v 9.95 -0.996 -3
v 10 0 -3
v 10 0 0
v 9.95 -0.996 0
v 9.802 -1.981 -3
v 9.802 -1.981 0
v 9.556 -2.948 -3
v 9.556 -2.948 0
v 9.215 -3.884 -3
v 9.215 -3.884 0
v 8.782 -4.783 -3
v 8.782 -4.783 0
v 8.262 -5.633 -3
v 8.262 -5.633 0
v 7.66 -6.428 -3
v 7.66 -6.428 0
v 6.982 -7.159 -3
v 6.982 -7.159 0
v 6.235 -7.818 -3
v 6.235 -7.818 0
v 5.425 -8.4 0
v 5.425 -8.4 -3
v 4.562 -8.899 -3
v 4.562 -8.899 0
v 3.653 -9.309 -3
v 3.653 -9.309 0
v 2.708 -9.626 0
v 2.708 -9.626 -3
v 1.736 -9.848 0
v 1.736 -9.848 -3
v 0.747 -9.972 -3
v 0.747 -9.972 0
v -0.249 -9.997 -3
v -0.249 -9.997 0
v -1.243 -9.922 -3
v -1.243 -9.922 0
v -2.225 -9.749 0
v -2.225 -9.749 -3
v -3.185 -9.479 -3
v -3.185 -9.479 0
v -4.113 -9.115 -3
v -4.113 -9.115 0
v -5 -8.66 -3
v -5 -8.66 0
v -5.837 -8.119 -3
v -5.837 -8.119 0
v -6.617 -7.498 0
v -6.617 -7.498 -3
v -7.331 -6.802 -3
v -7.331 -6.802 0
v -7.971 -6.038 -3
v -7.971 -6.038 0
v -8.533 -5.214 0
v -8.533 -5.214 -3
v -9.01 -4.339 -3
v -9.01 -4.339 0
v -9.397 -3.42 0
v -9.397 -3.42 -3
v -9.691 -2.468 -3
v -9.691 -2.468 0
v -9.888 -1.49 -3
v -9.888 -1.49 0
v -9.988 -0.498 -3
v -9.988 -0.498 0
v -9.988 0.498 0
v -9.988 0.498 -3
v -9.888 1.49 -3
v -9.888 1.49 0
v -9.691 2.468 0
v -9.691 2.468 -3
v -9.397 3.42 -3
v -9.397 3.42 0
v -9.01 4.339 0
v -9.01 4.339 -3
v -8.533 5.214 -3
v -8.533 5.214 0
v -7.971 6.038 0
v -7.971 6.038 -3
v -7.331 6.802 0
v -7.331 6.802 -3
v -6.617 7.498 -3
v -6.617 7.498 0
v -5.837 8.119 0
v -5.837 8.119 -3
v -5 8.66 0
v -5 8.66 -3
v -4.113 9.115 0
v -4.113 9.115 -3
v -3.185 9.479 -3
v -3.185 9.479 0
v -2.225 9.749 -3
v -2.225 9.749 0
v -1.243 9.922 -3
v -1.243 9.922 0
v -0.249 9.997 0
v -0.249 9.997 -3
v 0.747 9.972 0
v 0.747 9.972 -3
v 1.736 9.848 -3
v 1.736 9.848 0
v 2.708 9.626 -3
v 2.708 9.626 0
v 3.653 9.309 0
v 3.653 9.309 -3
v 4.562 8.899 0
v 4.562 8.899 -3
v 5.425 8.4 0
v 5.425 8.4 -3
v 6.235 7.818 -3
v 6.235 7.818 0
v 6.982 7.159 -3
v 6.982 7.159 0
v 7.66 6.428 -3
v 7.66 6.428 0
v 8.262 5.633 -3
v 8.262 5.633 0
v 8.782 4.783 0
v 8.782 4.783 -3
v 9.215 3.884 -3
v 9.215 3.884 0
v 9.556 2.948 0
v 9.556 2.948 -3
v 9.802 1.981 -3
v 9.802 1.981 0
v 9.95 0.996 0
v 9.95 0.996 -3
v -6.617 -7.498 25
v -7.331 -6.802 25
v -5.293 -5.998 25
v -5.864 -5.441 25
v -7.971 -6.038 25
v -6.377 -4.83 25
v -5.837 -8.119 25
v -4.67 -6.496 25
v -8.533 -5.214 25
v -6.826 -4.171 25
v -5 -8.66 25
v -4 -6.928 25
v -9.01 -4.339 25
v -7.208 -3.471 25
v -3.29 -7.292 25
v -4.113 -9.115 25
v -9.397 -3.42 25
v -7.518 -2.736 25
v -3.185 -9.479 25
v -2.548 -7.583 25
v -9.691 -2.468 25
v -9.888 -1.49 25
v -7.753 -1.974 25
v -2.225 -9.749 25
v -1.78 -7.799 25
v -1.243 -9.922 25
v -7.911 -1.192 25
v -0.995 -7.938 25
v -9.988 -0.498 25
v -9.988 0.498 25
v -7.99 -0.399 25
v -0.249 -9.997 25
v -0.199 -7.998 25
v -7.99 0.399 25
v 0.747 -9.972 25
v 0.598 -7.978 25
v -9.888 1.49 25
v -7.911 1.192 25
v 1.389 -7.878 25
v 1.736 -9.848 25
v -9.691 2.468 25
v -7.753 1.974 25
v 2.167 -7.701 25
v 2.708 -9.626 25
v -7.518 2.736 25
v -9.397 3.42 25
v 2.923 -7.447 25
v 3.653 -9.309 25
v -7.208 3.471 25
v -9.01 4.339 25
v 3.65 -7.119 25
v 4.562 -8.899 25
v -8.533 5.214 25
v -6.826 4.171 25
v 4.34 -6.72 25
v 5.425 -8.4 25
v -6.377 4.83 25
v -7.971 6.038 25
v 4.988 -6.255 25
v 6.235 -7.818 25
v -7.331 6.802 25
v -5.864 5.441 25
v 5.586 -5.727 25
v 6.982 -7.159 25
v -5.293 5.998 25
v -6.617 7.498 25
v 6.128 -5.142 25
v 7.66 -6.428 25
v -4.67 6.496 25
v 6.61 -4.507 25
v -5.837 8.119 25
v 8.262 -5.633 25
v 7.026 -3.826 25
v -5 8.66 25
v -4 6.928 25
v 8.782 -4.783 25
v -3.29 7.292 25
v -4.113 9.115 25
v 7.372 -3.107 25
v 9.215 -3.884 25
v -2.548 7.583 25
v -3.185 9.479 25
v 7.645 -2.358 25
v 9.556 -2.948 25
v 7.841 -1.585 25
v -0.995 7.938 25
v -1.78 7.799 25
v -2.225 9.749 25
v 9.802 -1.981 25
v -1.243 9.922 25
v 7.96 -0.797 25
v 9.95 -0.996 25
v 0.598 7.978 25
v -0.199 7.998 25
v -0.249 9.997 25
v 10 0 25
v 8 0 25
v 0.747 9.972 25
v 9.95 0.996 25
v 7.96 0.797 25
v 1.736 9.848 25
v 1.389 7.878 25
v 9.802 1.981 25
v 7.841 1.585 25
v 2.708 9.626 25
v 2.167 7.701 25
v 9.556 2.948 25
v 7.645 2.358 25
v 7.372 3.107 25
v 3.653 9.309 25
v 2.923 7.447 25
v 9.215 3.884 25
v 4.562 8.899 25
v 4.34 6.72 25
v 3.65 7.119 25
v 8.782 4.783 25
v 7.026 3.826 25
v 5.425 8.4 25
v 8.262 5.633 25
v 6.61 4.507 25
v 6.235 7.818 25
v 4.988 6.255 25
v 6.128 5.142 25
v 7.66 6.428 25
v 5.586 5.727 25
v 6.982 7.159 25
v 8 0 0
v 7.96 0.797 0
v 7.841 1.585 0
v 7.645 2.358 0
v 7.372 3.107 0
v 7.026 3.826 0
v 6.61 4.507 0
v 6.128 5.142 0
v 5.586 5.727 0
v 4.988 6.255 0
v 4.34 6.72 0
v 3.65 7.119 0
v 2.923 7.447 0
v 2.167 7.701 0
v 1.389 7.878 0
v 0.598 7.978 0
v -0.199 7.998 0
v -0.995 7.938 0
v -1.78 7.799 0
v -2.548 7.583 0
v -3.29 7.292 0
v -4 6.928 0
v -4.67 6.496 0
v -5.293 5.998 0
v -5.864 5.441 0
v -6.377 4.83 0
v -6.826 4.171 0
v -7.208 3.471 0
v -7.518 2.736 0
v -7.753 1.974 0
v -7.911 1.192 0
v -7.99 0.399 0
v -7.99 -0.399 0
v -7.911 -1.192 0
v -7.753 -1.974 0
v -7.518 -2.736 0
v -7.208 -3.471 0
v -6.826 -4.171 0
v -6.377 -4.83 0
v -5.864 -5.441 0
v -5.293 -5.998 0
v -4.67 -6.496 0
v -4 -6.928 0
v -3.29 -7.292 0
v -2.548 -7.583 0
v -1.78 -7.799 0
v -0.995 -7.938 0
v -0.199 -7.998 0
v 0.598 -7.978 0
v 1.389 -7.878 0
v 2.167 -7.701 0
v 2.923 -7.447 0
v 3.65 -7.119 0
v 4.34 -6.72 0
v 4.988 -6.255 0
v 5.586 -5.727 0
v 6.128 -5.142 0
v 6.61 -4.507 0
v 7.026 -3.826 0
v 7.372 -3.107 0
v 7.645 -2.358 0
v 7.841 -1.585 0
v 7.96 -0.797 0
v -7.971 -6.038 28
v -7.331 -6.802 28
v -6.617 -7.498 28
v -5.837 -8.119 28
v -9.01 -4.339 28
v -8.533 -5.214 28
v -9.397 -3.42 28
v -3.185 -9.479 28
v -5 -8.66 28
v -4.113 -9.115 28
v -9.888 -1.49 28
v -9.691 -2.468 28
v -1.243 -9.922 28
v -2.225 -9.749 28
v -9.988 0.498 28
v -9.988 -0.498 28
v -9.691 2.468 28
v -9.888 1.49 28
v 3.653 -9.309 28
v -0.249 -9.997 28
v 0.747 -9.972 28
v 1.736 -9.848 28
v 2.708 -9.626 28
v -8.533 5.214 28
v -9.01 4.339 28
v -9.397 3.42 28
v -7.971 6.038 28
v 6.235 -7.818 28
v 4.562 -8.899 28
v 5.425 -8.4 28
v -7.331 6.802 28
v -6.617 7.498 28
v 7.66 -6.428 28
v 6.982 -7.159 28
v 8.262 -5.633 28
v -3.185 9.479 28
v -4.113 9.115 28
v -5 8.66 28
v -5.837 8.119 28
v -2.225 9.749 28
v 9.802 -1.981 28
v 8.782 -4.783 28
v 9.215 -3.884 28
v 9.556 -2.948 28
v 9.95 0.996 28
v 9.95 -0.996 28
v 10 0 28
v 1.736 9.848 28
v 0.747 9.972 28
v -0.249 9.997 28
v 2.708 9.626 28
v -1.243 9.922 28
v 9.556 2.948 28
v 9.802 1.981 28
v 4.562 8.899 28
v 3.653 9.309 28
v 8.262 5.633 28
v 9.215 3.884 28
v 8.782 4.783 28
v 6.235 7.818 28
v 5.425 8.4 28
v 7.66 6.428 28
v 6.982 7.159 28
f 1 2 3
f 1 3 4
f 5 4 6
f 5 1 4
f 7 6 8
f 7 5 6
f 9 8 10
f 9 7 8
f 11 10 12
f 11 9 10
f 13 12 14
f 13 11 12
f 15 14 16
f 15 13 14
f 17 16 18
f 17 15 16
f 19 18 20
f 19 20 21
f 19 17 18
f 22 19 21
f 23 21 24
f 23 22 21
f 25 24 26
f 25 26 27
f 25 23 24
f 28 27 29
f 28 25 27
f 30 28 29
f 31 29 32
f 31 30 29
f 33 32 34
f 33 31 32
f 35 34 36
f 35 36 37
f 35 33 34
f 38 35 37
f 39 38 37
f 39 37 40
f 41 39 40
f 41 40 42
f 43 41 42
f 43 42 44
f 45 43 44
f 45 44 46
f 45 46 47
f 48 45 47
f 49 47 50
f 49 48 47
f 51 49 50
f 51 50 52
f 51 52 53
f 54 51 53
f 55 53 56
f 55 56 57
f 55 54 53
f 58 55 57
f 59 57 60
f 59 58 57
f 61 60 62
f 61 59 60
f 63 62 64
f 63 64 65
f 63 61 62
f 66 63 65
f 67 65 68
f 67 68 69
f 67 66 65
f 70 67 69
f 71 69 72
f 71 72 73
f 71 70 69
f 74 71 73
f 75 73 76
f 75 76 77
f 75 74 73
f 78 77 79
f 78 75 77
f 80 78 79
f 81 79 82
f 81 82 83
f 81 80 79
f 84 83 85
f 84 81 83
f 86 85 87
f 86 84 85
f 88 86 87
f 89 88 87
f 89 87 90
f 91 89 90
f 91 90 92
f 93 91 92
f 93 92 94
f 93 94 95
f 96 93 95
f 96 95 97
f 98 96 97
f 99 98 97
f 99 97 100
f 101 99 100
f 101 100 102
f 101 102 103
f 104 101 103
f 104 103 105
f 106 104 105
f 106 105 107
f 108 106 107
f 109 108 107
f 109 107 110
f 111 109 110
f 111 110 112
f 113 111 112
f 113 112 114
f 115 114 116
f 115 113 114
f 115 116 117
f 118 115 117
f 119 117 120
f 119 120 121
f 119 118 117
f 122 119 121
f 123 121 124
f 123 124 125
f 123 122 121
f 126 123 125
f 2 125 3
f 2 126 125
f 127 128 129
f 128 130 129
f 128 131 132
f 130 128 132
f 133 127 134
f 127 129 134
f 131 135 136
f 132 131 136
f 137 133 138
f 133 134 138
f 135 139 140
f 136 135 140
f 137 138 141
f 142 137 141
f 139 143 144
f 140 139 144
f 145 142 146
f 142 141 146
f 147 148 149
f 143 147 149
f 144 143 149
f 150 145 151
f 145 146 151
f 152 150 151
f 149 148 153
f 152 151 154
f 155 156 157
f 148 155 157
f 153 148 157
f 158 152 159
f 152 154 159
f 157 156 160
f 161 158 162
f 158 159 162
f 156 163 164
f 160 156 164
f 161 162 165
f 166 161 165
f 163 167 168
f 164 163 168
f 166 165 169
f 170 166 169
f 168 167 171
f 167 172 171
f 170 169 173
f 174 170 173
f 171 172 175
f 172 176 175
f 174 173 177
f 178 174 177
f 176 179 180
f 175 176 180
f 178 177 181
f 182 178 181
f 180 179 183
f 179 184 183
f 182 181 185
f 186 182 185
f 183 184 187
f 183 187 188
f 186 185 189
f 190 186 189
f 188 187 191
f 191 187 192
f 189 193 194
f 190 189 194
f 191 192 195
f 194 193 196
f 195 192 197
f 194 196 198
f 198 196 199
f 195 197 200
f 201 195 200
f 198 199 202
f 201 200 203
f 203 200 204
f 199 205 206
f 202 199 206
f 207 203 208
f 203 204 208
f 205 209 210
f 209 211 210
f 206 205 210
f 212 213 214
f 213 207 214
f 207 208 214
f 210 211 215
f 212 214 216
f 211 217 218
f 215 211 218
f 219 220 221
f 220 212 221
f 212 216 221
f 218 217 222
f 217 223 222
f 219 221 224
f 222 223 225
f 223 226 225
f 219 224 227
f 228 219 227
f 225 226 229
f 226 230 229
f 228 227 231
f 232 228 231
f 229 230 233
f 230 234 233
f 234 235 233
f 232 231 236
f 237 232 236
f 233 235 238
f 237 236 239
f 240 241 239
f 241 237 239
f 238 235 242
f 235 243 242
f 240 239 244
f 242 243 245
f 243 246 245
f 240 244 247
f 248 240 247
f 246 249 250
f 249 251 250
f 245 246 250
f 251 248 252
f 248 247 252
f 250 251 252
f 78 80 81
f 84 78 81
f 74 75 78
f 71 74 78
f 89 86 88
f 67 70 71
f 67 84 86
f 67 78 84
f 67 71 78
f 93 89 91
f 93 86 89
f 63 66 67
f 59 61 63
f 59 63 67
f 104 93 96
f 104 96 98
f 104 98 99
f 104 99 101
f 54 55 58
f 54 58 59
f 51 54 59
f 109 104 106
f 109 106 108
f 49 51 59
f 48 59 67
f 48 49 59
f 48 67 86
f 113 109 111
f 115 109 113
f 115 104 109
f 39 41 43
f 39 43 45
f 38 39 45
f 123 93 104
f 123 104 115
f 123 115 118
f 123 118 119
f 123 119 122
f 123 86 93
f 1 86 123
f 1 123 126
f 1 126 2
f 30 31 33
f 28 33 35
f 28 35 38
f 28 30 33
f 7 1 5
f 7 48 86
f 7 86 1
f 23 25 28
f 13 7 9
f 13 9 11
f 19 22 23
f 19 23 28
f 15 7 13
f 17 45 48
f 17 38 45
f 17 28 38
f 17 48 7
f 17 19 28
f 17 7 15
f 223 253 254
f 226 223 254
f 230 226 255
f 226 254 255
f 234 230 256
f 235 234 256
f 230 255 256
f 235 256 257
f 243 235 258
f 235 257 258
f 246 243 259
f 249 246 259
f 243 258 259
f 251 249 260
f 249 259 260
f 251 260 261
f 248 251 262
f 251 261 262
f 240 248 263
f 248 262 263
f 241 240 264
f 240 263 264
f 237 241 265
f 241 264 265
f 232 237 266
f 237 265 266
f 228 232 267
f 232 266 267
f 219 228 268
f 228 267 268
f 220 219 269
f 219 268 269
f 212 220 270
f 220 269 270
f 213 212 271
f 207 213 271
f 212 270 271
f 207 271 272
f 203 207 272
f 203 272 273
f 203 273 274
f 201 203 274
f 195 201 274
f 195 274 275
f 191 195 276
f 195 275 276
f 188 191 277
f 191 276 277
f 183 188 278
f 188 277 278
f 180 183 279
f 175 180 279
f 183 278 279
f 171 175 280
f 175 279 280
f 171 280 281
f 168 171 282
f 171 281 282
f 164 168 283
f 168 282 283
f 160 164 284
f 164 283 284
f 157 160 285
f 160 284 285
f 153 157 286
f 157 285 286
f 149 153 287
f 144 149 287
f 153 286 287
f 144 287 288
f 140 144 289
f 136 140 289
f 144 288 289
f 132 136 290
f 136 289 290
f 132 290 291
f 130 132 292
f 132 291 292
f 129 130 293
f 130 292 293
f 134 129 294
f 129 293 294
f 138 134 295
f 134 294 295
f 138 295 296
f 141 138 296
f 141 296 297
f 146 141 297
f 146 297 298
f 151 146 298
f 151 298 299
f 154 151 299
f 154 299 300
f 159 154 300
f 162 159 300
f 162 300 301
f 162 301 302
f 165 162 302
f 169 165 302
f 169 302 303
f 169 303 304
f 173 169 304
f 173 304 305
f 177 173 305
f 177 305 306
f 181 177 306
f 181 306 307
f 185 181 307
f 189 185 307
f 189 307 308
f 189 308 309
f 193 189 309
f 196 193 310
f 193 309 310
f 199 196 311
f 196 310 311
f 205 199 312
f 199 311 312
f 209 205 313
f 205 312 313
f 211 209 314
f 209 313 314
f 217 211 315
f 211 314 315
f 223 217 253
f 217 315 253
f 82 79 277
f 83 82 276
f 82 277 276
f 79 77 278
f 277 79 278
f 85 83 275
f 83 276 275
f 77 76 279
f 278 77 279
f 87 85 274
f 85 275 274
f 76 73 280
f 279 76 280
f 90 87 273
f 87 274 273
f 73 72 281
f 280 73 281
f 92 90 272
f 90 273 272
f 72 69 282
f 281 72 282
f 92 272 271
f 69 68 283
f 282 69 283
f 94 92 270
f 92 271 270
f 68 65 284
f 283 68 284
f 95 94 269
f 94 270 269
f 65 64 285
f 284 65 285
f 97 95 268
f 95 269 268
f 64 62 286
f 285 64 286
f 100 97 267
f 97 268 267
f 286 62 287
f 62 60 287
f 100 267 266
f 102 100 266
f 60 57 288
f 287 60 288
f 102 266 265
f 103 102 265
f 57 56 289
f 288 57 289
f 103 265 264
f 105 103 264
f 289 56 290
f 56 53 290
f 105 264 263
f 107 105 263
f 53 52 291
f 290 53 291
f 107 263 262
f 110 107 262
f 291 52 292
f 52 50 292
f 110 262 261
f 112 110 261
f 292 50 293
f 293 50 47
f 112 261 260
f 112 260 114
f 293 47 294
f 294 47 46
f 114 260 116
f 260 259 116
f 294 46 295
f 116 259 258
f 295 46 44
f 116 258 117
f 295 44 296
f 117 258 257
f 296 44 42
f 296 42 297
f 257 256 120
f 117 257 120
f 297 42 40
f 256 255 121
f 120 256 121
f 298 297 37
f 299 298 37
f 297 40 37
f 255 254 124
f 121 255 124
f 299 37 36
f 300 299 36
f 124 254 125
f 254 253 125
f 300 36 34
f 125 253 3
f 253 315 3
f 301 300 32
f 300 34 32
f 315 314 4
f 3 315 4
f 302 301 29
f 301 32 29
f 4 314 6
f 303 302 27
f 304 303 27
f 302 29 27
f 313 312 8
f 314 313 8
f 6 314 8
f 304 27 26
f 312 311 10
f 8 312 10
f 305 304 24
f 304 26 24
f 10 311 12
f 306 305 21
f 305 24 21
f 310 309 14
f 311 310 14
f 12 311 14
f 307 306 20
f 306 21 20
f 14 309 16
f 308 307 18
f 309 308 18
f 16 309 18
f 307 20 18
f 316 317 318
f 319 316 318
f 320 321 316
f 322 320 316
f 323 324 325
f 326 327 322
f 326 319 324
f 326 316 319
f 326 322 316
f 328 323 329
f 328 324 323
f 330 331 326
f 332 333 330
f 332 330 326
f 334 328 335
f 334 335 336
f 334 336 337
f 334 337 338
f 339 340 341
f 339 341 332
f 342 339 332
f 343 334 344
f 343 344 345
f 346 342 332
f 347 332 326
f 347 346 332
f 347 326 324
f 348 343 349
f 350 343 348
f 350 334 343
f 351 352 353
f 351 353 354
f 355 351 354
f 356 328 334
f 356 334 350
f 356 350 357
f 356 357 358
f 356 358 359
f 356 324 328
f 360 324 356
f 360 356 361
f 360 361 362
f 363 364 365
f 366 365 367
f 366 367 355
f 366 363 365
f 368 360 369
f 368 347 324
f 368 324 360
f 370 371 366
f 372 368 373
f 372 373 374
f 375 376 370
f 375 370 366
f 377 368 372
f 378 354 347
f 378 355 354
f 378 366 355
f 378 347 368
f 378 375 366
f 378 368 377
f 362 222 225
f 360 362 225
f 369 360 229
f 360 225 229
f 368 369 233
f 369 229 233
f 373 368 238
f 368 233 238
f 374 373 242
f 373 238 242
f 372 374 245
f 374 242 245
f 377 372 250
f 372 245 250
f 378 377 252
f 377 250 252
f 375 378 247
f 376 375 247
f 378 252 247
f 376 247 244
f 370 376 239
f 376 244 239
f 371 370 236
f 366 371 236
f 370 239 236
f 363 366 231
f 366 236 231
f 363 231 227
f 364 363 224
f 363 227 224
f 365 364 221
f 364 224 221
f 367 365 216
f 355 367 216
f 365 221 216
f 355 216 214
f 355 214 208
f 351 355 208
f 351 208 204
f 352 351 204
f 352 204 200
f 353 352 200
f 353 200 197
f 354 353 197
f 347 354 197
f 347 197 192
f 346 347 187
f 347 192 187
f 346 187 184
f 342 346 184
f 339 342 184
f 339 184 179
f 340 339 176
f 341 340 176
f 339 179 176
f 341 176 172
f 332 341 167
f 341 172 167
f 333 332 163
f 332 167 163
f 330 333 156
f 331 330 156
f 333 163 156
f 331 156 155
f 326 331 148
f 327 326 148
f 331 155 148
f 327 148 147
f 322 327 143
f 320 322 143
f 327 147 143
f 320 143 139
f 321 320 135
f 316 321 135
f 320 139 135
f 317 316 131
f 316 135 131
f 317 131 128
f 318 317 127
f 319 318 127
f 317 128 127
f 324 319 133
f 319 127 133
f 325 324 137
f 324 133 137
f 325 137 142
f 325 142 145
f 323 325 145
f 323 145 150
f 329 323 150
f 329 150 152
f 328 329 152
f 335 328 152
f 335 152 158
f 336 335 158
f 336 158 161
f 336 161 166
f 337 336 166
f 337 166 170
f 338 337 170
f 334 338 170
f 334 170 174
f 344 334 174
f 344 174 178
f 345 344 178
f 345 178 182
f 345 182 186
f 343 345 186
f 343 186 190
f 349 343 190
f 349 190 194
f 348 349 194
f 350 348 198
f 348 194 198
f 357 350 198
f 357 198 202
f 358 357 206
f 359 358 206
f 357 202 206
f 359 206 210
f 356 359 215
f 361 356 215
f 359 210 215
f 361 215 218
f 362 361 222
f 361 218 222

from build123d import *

# Parameters (mm, degrees)
SKETCH_1_R      = 8
EXTRUDE_3_DEPTH = 25
SKETCH_3_R      = 10
EXTRUDE_4_DEPTH = 3
EXTRUDE_START   = 3
SKETCH_4_R      = 10
EXTRUDE_5_DEPTH = 3


with BuildPart() as part:
    # 草图1 → 凸台-拉伸3 (new body)
    with BuildSketch(Plane.XY):
        Circle(SKETCH_1_R)
    extrude(amount=EXTRUDE_3_DEPTH)

    # 草图3 → 凸台-拉伸4 (add)
    with BuildSketch(Plane.XY.offset(25)):
        Circle(SKETCH_3_R)
    extrude(amount=EXTRUDE_4_DEPTH)

    # 草图4 → 凸台-拉伸5 (add)
    with BuildSketch(Plane(origin=(0, 0, 0), x_dir=(-1, 0, 0), z_dir=(0, 0, -1)).offset(EXTRUDE_START)):
        with Locations(Location((0, 0, 0), (0, 0, 180))):
            Circle(SKETCH_4_R)
    extrude(amount=-EXTRUDE_5_DEPTH)


solid = part.part
